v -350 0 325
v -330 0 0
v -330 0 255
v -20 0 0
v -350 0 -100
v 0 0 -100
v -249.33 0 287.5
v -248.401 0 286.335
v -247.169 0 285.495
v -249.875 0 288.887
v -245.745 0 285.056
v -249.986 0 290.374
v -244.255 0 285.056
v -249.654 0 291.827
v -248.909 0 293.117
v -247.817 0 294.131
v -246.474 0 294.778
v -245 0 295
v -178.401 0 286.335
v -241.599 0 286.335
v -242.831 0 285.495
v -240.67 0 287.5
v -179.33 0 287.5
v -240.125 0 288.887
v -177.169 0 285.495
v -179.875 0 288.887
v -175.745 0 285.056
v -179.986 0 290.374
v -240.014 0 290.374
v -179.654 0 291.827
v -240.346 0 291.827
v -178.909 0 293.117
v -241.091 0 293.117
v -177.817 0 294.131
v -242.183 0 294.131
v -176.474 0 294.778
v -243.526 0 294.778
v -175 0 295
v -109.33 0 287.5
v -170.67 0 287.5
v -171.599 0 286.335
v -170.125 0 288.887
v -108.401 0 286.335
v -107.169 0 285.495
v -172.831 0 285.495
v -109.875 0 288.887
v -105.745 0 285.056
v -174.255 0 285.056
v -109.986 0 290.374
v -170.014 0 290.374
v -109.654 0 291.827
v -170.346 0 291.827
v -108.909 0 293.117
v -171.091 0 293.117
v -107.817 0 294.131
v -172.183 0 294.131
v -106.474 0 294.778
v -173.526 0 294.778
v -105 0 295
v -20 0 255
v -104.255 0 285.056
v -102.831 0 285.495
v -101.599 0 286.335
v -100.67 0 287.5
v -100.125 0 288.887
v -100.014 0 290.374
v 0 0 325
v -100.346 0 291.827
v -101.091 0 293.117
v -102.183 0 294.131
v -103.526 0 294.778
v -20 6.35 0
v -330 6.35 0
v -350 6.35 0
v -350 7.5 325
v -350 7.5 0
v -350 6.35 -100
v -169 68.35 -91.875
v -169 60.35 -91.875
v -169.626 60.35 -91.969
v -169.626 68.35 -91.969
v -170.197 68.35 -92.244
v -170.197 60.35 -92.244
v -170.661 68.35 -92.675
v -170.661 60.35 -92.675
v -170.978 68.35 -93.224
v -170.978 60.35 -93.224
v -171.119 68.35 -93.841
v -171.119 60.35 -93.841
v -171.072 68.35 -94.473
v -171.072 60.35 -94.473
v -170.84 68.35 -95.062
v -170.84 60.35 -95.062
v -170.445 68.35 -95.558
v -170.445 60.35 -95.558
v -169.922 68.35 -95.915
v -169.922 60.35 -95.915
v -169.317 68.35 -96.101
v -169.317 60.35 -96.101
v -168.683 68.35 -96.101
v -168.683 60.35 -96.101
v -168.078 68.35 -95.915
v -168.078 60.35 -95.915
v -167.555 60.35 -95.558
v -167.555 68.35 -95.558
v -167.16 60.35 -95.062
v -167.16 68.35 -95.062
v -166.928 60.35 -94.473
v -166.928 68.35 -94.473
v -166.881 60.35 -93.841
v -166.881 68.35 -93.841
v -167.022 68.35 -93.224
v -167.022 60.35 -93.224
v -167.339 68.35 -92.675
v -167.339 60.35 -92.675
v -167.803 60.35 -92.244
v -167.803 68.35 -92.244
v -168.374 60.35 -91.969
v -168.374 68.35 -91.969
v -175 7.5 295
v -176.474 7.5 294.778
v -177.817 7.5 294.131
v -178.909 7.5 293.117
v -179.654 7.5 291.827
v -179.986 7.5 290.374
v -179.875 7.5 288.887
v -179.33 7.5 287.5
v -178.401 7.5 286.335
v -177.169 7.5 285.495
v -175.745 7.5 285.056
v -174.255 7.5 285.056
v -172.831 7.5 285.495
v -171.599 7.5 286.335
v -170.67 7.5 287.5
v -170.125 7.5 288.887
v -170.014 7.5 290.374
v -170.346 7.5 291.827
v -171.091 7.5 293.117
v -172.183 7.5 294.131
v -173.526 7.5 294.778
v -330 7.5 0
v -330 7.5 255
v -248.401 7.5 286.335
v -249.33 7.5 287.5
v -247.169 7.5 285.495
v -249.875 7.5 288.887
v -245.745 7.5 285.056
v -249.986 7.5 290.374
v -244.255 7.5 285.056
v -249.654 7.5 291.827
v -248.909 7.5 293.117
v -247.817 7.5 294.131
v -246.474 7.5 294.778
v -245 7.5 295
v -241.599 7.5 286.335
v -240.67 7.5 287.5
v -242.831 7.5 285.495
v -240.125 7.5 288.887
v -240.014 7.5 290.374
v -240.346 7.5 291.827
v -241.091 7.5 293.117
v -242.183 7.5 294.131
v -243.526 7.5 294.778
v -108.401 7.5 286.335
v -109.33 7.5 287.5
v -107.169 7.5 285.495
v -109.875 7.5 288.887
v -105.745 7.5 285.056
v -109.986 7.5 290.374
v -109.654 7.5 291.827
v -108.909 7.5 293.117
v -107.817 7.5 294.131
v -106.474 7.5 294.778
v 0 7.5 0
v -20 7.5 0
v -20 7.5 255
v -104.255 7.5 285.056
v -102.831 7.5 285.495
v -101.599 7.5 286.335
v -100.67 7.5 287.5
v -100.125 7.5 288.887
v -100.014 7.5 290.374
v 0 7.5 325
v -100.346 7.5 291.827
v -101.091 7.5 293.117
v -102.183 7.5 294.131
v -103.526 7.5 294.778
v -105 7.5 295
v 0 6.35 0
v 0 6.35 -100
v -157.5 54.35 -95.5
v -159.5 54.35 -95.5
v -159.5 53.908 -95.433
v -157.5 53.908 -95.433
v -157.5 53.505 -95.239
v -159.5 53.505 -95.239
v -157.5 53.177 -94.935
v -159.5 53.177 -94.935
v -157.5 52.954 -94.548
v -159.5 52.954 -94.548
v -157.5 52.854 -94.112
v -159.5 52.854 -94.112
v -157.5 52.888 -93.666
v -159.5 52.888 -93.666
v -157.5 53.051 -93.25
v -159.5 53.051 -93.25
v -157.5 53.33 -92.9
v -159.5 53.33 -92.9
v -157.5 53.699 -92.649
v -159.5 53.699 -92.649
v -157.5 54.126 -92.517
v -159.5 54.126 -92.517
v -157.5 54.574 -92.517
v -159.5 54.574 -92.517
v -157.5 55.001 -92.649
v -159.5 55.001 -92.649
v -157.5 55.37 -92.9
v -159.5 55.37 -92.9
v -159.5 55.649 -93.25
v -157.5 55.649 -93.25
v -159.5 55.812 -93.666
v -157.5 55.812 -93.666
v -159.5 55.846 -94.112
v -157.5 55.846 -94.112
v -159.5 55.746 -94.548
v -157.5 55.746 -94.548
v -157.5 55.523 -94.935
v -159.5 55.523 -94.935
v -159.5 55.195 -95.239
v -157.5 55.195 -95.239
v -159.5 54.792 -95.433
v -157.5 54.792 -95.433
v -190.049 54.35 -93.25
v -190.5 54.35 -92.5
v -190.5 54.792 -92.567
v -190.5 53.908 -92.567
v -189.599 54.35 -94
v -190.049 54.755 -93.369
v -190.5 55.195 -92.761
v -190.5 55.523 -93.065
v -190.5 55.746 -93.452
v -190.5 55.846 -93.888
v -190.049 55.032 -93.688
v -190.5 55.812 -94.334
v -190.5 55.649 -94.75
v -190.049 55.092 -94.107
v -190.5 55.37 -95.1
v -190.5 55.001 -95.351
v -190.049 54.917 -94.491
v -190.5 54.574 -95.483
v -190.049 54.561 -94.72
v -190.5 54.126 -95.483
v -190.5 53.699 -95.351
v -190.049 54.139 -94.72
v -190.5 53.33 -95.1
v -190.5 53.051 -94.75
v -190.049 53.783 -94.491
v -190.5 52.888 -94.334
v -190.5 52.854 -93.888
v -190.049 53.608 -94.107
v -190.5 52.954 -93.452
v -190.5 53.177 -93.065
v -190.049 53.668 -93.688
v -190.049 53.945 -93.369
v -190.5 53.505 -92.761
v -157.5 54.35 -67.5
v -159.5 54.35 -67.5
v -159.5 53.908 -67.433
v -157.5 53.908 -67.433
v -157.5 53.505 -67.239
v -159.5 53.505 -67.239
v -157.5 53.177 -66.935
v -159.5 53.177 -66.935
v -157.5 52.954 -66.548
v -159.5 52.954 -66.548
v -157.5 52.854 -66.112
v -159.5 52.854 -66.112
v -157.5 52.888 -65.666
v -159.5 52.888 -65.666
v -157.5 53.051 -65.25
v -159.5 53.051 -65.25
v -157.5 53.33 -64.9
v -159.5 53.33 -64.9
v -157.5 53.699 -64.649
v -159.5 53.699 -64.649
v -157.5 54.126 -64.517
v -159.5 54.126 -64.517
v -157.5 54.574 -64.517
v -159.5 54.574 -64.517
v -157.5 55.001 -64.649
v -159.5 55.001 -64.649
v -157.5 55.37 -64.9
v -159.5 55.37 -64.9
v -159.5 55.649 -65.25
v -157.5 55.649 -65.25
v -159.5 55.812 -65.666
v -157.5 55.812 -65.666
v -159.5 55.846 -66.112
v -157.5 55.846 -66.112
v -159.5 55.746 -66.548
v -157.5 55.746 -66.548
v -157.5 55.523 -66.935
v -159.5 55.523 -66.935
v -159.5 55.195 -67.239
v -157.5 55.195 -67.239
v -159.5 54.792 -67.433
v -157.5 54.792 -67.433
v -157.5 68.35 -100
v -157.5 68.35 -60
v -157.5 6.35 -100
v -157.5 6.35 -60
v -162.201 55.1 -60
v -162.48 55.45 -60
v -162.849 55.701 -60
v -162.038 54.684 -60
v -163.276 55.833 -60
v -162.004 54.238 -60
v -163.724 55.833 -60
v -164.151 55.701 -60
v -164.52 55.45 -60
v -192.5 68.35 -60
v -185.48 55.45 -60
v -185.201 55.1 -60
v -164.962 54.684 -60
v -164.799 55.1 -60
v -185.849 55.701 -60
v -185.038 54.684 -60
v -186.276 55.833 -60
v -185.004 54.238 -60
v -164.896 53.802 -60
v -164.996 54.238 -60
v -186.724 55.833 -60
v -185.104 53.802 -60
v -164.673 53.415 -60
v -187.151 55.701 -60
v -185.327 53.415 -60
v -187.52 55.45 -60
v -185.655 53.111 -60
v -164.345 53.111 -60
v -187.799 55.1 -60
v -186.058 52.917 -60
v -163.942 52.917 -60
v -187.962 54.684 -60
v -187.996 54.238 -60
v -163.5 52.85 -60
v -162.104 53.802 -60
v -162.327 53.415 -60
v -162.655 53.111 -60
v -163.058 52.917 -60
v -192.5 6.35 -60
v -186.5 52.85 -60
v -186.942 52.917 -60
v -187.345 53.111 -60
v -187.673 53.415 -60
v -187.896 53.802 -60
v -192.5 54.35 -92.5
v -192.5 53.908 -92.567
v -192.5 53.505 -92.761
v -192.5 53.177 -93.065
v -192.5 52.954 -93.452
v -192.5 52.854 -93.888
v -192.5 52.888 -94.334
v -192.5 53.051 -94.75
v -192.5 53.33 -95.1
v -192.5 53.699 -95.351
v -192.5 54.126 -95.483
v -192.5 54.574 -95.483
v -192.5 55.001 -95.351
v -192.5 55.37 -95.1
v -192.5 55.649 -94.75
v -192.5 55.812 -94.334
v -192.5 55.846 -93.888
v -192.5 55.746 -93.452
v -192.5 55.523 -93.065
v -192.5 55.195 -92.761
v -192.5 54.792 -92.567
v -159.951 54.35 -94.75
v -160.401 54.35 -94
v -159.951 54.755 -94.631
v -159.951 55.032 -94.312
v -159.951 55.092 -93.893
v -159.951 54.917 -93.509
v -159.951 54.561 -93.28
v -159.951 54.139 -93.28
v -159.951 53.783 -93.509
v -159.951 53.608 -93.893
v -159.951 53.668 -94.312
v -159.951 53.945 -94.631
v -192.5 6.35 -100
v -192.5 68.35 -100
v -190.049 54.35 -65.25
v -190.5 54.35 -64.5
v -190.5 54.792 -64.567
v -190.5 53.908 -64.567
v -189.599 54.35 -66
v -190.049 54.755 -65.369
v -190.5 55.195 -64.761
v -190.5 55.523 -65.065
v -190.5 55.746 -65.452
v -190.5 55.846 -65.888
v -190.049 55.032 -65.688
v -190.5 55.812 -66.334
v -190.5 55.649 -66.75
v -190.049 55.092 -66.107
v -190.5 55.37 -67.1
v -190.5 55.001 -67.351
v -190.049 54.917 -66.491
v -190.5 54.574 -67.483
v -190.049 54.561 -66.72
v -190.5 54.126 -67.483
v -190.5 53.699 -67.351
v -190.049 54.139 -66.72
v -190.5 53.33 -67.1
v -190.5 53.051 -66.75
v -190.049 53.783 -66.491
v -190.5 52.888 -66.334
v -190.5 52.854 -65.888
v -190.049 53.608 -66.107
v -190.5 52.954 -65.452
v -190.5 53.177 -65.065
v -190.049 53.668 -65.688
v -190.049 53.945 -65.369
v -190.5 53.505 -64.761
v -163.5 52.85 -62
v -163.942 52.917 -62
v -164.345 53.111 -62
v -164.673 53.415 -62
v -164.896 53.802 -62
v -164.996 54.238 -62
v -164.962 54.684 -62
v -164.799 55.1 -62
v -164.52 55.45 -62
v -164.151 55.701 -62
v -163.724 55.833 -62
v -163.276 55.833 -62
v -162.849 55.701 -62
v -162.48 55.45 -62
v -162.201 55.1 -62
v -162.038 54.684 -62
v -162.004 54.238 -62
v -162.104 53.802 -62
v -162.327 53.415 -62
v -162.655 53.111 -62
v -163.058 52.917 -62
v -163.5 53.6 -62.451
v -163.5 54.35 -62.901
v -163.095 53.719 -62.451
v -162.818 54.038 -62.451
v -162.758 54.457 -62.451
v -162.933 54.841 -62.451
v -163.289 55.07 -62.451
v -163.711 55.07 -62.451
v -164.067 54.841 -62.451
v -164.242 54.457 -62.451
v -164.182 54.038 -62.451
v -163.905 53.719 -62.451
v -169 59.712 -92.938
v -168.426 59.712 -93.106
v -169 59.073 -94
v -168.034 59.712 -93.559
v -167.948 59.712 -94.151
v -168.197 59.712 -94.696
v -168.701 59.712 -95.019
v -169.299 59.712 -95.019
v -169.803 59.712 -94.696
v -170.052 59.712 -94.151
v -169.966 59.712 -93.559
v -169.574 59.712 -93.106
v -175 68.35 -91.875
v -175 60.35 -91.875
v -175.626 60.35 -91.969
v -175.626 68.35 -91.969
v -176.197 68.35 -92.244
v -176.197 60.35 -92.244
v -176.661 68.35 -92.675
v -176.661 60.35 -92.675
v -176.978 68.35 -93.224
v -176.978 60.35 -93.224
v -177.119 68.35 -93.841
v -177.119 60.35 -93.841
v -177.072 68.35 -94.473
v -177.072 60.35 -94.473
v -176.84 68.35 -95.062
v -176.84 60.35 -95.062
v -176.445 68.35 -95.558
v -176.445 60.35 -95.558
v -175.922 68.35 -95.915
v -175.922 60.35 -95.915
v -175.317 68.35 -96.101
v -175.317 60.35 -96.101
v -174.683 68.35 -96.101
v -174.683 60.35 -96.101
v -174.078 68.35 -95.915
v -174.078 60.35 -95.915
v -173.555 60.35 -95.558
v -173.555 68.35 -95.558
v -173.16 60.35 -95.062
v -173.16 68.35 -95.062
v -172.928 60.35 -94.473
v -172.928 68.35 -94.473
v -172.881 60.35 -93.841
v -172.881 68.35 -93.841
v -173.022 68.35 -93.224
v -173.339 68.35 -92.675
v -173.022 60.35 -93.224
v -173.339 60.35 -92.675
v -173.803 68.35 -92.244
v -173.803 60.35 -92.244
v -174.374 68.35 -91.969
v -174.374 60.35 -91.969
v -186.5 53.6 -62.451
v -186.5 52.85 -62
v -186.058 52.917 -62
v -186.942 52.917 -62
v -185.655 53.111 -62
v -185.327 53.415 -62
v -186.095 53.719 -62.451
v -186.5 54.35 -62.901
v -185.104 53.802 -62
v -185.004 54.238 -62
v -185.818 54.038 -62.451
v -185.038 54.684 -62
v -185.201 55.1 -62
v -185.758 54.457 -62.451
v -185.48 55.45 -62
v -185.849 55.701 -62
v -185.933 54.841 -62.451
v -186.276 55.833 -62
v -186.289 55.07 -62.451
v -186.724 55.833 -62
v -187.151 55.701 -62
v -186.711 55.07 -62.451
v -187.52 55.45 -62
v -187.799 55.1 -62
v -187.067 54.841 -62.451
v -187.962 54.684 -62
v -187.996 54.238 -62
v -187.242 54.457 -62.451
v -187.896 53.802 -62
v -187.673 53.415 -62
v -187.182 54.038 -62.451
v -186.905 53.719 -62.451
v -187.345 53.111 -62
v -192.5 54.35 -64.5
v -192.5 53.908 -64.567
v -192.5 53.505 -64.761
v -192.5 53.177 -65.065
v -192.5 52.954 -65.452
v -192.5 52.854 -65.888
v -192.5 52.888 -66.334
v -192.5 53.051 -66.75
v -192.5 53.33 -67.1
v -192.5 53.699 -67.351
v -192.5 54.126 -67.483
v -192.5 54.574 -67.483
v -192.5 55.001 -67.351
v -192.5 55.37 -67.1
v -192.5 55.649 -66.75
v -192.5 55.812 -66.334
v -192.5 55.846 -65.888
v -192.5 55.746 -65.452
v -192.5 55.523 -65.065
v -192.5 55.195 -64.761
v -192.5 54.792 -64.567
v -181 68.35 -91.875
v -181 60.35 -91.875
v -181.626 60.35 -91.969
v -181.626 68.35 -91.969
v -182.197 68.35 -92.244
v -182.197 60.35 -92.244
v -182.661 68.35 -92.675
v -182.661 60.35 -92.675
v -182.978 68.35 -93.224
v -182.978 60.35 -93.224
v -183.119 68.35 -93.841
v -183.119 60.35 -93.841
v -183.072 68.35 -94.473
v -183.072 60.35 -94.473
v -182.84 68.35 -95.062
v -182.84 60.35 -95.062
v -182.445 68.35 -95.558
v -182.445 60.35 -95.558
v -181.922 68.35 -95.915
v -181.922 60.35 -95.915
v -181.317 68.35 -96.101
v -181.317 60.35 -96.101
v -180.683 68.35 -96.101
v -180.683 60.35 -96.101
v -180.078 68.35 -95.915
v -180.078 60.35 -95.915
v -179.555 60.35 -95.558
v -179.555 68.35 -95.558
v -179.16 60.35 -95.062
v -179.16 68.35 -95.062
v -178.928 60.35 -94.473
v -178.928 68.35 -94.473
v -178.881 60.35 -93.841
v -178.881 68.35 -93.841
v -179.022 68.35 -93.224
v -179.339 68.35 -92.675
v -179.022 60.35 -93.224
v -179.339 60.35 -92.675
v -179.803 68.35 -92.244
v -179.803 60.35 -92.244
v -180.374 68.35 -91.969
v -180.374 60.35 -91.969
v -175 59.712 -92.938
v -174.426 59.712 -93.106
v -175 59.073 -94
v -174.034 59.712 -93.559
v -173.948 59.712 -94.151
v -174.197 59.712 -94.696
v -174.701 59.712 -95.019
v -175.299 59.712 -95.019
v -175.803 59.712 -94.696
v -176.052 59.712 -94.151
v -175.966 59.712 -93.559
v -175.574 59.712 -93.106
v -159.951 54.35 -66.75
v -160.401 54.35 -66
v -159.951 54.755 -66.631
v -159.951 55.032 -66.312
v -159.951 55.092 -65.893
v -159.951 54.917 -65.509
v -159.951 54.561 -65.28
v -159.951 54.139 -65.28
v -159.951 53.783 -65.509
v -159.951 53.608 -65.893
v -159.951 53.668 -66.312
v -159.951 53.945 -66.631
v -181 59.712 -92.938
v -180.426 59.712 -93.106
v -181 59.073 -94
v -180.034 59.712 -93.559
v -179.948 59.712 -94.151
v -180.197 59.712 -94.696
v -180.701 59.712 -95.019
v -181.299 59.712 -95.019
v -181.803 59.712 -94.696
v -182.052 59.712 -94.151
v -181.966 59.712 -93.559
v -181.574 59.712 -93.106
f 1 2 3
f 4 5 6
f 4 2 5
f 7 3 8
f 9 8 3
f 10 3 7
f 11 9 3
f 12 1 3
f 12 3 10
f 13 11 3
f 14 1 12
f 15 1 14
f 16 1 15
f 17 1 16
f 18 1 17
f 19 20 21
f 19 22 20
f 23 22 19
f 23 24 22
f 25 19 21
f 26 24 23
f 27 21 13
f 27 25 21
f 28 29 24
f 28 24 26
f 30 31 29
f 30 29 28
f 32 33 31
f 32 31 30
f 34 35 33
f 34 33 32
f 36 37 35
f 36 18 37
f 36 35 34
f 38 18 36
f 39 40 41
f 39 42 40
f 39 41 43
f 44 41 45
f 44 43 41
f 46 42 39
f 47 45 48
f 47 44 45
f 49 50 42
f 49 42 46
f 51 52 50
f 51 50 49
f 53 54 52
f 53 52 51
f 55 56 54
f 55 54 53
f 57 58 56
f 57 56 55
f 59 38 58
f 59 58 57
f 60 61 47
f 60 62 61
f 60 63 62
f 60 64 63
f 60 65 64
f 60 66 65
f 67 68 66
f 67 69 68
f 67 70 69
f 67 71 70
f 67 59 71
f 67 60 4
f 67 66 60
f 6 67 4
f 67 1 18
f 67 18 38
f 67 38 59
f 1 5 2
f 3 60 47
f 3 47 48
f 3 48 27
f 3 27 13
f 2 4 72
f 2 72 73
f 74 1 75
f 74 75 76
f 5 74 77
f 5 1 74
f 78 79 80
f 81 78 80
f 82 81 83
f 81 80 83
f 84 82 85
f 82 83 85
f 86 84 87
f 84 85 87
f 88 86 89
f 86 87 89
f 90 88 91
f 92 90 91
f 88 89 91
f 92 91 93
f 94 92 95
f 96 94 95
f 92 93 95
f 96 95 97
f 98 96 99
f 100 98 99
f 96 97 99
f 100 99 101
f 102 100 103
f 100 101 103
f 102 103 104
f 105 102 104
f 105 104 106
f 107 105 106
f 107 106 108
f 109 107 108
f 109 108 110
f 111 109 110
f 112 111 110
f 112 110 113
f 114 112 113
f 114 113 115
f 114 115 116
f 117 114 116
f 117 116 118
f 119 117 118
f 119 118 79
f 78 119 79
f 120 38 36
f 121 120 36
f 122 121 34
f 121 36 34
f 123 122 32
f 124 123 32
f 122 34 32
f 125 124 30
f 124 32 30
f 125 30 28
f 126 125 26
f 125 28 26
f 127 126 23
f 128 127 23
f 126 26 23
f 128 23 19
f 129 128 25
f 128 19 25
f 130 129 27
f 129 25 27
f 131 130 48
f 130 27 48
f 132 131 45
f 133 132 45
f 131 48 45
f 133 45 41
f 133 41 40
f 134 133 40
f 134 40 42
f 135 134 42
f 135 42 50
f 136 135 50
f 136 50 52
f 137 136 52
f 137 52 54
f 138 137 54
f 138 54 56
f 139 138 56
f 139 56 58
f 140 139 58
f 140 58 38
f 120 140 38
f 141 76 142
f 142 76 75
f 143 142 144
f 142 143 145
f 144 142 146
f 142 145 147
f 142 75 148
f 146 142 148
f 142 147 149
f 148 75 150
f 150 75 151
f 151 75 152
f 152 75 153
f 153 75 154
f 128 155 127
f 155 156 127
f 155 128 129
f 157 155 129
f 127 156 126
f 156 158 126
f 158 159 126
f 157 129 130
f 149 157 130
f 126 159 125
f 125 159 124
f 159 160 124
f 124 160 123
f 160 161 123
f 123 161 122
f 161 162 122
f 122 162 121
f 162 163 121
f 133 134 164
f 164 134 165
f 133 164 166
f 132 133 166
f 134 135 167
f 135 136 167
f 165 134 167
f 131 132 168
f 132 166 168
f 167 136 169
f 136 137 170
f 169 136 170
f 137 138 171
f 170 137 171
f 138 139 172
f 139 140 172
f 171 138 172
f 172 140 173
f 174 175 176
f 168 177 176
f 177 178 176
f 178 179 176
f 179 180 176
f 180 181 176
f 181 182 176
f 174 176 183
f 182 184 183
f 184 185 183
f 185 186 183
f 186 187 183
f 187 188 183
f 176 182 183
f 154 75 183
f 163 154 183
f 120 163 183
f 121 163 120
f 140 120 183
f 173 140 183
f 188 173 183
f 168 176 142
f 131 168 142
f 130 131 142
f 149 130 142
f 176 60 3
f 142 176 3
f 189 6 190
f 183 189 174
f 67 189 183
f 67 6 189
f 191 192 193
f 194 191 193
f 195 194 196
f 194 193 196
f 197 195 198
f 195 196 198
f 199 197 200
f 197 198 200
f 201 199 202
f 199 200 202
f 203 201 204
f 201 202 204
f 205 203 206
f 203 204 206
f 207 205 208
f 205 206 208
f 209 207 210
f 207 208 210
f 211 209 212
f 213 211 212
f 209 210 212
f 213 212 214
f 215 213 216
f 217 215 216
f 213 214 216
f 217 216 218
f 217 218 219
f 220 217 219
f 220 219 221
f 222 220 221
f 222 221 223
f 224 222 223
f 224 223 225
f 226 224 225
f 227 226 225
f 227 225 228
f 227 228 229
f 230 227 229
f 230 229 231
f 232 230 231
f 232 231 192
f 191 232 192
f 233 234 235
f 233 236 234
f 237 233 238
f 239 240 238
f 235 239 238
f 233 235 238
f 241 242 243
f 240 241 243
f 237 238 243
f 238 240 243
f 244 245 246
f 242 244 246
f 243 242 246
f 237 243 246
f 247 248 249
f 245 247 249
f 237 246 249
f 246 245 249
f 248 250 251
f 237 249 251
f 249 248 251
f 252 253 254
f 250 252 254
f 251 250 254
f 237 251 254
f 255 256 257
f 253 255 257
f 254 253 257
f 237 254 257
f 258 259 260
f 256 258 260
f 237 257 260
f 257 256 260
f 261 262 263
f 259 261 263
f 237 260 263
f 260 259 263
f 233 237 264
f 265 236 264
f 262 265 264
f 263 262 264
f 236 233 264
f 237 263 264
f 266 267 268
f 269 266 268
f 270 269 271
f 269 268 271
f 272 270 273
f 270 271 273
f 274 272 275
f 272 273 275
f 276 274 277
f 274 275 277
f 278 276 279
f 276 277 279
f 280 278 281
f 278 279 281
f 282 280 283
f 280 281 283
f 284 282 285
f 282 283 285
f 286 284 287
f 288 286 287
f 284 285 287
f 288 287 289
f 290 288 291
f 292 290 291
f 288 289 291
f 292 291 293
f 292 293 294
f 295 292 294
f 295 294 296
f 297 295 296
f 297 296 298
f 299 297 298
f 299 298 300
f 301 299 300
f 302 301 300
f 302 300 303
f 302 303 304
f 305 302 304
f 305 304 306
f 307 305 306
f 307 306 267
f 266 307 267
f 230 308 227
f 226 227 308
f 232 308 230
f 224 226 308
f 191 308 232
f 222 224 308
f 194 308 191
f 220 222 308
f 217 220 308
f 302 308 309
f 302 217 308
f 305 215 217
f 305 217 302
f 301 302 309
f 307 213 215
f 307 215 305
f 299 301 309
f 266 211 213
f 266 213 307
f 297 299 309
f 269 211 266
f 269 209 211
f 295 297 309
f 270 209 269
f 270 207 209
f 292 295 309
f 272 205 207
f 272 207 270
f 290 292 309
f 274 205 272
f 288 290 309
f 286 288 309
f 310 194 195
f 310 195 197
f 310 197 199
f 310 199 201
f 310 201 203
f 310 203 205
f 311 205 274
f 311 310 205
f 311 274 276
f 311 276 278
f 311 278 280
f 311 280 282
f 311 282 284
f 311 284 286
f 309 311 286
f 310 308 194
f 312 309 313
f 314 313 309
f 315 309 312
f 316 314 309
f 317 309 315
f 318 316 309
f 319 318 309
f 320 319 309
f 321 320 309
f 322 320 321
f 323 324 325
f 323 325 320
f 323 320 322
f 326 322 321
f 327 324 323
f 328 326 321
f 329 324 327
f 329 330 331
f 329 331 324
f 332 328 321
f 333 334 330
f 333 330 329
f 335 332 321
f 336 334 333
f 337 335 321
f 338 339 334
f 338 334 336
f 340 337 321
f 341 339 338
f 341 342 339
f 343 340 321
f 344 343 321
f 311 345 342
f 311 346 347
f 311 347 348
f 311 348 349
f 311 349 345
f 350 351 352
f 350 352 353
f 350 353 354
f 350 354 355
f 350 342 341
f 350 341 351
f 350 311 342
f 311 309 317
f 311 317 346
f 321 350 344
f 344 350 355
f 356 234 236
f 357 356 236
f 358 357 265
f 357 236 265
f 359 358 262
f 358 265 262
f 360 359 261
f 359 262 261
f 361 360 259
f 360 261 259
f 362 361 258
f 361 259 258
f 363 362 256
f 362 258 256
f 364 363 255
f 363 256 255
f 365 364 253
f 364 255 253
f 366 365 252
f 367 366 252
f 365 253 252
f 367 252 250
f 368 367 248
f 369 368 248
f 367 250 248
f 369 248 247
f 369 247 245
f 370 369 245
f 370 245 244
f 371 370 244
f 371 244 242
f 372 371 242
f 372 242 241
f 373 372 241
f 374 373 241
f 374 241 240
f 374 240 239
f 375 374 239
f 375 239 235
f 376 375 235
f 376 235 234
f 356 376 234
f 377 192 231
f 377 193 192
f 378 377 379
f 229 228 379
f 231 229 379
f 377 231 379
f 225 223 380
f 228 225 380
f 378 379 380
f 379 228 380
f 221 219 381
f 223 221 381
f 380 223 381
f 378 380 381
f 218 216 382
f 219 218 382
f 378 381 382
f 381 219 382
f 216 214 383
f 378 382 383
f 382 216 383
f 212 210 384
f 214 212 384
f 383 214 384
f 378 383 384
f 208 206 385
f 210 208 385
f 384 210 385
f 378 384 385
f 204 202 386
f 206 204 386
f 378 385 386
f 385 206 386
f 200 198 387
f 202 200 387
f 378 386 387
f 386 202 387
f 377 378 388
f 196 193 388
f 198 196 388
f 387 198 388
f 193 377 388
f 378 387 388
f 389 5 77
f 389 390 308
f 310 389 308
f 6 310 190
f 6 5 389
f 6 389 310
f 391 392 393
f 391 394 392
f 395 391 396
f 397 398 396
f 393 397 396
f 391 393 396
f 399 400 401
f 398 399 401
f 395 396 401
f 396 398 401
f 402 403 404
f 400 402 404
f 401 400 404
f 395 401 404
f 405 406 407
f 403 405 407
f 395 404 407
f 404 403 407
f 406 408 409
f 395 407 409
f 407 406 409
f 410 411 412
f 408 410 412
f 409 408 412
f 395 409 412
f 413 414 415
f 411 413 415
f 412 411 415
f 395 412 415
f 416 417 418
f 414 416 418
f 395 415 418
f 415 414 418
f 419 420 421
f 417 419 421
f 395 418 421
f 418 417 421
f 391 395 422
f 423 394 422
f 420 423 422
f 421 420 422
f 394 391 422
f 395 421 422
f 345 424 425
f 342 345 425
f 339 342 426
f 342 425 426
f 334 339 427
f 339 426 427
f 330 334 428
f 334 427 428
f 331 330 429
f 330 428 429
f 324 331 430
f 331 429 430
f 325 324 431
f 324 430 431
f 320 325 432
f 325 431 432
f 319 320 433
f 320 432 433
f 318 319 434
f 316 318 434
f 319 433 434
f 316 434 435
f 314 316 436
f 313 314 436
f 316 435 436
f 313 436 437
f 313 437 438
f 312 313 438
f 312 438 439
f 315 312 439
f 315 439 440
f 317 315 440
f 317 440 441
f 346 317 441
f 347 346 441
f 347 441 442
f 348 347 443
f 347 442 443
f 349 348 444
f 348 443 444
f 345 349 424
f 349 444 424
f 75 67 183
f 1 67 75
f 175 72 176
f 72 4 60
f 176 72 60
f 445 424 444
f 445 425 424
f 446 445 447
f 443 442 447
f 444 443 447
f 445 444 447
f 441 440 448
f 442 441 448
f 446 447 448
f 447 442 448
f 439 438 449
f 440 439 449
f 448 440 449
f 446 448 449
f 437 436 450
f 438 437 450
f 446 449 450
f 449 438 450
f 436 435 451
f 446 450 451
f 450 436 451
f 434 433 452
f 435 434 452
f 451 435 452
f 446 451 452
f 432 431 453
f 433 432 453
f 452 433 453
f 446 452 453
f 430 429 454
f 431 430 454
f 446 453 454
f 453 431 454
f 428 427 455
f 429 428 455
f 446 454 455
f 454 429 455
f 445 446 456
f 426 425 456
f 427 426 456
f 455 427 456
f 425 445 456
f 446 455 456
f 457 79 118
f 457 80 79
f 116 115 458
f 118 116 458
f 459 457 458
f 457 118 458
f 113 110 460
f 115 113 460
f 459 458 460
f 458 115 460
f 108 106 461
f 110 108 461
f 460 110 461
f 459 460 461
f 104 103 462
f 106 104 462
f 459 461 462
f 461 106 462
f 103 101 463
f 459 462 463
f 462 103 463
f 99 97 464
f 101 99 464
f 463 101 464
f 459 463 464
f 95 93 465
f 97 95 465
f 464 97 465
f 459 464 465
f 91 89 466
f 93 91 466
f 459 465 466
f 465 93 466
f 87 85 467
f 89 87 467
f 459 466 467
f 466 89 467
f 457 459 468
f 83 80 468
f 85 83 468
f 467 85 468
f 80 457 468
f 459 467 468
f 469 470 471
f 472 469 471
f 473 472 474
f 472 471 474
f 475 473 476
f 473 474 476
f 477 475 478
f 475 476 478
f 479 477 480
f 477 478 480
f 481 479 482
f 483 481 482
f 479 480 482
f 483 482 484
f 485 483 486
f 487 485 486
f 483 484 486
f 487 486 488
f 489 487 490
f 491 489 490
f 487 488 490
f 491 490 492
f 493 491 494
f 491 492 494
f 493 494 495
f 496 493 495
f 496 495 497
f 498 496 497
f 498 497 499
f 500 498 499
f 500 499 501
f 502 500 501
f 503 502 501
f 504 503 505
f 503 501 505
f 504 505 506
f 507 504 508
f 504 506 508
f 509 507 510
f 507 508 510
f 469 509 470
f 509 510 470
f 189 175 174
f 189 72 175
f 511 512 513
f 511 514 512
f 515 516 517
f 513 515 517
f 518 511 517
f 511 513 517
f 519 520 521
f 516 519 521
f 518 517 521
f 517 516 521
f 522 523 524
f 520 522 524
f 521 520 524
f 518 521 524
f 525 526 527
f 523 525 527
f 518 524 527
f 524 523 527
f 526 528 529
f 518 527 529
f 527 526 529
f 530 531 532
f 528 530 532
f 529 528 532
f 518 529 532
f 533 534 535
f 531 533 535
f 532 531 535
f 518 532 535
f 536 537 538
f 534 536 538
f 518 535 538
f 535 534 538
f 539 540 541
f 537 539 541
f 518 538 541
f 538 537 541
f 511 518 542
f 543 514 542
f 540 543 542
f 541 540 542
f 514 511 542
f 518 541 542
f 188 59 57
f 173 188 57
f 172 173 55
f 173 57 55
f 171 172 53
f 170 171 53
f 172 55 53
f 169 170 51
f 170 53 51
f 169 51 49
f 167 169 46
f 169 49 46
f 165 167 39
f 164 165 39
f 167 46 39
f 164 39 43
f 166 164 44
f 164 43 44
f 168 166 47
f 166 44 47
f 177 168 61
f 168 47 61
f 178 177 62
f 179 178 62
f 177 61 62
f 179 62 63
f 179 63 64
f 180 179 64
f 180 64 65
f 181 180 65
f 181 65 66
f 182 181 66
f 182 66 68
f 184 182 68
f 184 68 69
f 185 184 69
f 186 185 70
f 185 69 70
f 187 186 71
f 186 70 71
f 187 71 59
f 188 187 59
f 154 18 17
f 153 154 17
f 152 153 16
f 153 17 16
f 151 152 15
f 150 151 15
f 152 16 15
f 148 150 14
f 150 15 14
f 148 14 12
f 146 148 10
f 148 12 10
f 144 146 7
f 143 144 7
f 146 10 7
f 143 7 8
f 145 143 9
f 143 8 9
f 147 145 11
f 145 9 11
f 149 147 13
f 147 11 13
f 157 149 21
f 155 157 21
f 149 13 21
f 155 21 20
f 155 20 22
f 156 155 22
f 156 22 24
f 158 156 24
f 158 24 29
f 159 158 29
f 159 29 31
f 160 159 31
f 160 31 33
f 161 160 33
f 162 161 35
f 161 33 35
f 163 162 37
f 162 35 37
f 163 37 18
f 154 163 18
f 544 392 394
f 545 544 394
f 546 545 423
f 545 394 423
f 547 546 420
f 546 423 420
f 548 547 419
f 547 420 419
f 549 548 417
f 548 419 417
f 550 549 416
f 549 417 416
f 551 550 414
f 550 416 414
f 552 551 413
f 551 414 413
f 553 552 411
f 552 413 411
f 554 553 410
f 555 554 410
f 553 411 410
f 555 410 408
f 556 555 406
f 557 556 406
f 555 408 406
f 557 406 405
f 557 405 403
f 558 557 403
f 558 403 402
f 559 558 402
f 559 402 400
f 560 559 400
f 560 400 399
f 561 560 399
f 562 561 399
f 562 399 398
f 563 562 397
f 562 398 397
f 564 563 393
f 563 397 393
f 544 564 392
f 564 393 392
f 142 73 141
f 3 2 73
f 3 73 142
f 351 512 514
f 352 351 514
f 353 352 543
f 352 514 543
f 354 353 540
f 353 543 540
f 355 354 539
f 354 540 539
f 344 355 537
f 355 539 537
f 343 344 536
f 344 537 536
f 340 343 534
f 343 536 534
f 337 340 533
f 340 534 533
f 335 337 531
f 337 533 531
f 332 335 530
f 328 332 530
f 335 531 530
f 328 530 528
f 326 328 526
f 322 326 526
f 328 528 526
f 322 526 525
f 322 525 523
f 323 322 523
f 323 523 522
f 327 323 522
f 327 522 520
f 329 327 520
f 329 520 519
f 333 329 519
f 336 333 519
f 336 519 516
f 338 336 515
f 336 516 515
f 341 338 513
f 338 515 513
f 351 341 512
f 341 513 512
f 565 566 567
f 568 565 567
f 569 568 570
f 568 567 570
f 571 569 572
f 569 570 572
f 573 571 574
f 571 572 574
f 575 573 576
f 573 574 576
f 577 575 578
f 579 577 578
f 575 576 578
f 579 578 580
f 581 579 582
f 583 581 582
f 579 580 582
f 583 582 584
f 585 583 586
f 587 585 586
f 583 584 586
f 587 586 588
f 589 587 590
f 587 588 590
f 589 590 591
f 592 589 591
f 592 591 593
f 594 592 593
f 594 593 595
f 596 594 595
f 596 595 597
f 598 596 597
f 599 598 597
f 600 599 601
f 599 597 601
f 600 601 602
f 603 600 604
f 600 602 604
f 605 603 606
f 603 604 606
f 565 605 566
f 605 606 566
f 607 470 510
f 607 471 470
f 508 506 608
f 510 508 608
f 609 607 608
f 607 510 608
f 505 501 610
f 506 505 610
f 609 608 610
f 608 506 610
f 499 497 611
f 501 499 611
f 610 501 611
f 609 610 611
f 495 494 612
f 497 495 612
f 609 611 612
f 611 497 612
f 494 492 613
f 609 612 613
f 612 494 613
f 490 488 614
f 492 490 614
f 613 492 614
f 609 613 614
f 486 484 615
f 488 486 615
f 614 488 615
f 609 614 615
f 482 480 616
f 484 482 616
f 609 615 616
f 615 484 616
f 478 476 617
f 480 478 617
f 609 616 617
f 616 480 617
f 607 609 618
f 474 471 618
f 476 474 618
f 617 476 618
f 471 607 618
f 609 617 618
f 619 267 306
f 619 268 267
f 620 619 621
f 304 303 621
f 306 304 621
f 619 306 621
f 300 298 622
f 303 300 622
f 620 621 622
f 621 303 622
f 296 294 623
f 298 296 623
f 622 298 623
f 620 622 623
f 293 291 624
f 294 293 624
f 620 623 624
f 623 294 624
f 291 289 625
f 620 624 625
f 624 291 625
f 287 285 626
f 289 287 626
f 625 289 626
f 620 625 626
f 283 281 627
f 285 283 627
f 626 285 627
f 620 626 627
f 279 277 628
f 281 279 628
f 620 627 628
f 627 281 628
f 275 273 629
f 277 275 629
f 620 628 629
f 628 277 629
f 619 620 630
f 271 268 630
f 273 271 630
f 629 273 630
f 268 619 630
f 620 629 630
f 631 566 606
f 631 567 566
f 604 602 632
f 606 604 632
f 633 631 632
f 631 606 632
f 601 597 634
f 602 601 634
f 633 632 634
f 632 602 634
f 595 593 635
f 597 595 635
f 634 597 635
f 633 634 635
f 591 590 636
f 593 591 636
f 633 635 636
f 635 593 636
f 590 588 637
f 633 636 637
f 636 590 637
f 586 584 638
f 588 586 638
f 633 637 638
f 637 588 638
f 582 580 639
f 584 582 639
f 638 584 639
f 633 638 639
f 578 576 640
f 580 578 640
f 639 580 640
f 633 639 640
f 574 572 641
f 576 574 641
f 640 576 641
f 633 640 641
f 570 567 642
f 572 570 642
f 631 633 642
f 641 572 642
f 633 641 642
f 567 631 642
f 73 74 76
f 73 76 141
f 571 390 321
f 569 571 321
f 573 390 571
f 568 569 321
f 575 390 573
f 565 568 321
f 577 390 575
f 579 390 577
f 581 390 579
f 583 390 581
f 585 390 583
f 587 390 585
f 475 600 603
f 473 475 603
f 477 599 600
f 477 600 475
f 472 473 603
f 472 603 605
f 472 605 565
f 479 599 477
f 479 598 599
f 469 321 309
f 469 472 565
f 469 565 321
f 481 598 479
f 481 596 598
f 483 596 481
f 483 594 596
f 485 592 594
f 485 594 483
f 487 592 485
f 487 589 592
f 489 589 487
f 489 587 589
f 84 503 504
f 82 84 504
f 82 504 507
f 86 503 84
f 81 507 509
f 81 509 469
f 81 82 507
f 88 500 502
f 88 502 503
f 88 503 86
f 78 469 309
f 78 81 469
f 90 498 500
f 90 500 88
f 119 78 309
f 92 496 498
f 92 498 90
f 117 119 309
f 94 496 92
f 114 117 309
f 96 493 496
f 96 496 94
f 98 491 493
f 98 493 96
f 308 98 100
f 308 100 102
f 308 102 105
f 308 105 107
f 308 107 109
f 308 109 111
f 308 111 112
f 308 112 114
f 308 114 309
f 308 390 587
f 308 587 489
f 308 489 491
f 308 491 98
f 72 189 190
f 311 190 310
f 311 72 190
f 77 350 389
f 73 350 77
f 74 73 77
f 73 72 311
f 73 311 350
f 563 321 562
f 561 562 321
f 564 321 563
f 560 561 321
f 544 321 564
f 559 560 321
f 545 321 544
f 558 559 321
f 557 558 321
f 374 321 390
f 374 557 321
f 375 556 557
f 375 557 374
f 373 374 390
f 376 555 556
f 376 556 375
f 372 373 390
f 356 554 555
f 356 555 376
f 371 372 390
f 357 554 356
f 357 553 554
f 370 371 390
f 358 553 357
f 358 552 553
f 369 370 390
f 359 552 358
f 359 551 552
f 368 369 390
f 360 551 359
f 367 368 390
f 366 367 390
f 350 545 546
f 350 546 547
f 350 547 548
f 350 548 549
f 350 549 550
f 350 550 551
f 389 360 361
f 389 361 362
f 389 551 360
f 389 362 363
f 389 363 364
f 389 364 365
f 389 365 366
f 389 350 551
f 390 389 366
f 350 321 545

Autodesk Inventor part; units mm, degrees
ref_plane "YZ Plane" through (0, 0, 0) normal (1, 0, 0) x (0, 1, 0)
ref_plane "XZ Plane" through (0, 0, 0) normal (0, 1, 0) x (-1, 0, 0)
ref_plane "XY Plane" through (0, 0, 0) normal (0, 0, 1) x (1, 0, 0)
sketch "Sketch1" plane through (0, 0, 0) normal (0, 1, 0) x (-1, 0, 0)
  line L0 (0, 0) -> (350, 0)
  line L1 (350, 0) -> (350, -100)
  line L2 (350, -100) -> (0, -100)
  line L3 (0, -100) -> (0, 0)
  dimension "d0" = 350
  dimension "d1" = 100
extrude "Extrusion1" add sketch "Sketch1" along normal blind 6.35
sketch "Sketch2" plane through (0, 6.35, 0) normal (0, 1, 0) x (1, 0, 0)
  line L0 (0, 100) -> (-350, 100) projected
  line L1 (-192.5, 100) -> (-157.5, 100)
  line L2 (-157.5, 100) -> (-157.5, 60)
  line L3 (-157.5, 60) -> (-192.5, 60)
  line L4 (-192.5, 60) -> (-192.5, 100)
  line L5 (0, 0) -> (0, 100) projected
  dimension "d10" = 35
  dimension "d11" = 40
  dimension "d12" = 157.5
extrude "Extrusion2" add sketch "Sketch2" along normal blind 62
sketch "Sketch3" plane through (0, 68.35, 0) normal (0, 1, 0) x (1, 0, 0)
  circle A0 centre (-175, 94) radius 2.125
  line L0 (-157.5, 100) -> (-192.5, 100) projected
  circle A1 centre (-169, 94) radius 2.125
  circle A2 centre (-181, 94) radius 2.125
  point P0 (0, 0)
  dimension "d15" = 4.25
  dimension "d16" = 6
  dimension "d17" = 4.25
  dimension "d18" = 6
  dimension "d19" = 4.25
  dimension "d20" = 6
hole "Hole1" at (-181, 68.35, -94) at (-175, 68.35, -94) at (-169, 68.35, -94) direction (0, -1, 0) diameter 4.25 depth 8 tip angle 118
sketch "Sketch4" plane through (-192.5, 6.35, -100) normal (-1, 0, 0) x (0, 0, 1)
  point P0 (100, -6.35)
sketch "Sketch5" plane through (-192.5, 6.35, -100) normal (-1, 0, 0) x (0, 0, 1)
  line L0 (0, 0) -> (0, 62) projected
  line L1 (0, 42) -> (40, 42)
  line L2 (40, 0) -> (40, 62) projected
  line L3 (0, 62) -> (40, 62) projected
  circle A0 centre (6, 48) radius 1.5
  circle A1 centre (34, 48) radius 1.5
  point P0 (100, -6.35)
  dimension "d28" = 20
  dimension "d29" = 3
  dimension "d30" = 3
  dimension "d31" = 6
  dimension "d32" = 6
  dimension "d33" = 6
  dimension "d34" = 6
hole "Hole2" at (-192.5, 54.35, -66) at (-192.5, 54.35, -94) direction (1, 0, 0) diameter 3 depth 2 tip angle 118
sketch "Sketch6" plane through (-192.5, 6.35, -60) normal (0, 0, 1) x (1, 0, 0)
  line L0 (0, 42) -> (35, 42)
  line L1 (0, 62) -> (35, 62) projected
  circle A0 centre (6, 48) radius 1.5
  line L2 (0, 0) -> (0, 62) projected
  circle A1 centre (29, 48) radius 1.5
  line L3 (35, 0) -> (35, 62) projected
  point P0 (192.5, -6.35)
  dimension "d42" = 20
  dimension "d43" = 3
  dimension "d44" = 6
  dimension "d45" = 6
  dimension "d46" = 3
  dimension "d47" = 6
  dimension "d48" = 6
hole "Hole3" at (-186.5, 54.35, -60) at (-163.5, 54.35, -60) direction (0, 0, -1) diameter 3 depth 2 tip angle 118
sketch "Sketch7" plane through (-157.5, 6.35, -60) normal (1, 0, 0) x (0, 0, -1)
  circle A0 centre (6, 48) radius 1.5 projected
  circle A1 centre (6, 48) radius 1.5
  circle A2 centre (34, 48) radius 1.5 projected
  circle A3 centre (34, 48) radius 1.5
  point P0 (-60, -6.35)
  dimension "d56" = 3
  dimension "d57" = 3
hole "Hole4" at (-157.5, 54.35, -66) at (-157.5, 54.35, -94) direction (-1, 0, 0) diameter 3 depth 2 tip angle 118
sketch "Sketch8" plane through (0, 0, 0) normal (0, -1, 0) x (1, 0, 0)
  line L0 (-350, -100) -> (0, -100) projected
  line L1 (-350, -100) -> (-330, -100)
  line L2 (-330, 0) -> (-330, 255)
  line L3 (-330, 325) -> (-350, 325)
  line L4 (-350, 325) -> (-350, 0)
  line L5 (-350, 325) -> (0, 325)
  line L6 (0, 0) -> (0, -100) projected
  line L7 (0, 325) -> (0, 0)
  line L8 (0, -100) -> (-20, -100)
  line L9 (0, -100) -> (-157.5, -100) projected
  line L10 (-20, 0) -> (-20, 255)
  line L11 (-20, 325) -> (50, 325) construction
  line L12 (-20, 255) -> (-330, 255)
  line L13 (-350, 0) -> (0, 0) projected
  line L14 (-350, 0) -> (-330, 0)
  line L15 (-20, 0) -> (0, 0)
  dimension "d65" = 20
  dimension "d66" = 425
extrude "Extrusion3" add sketch "Sketch8" against normal blind 7.5 contours L13 L4 L3 L5 L7 L10 L12 L2
sketch "Sketch9" plane through (0, 7.5, 0) normal (0, 1, 0) x (1, 0, 0)
  line L0 (-20, -255) -> (-330, -255) projected
  line L1 (-175, -255) -> (-175, -325)
  line L2 (-350, -325) -> (0, -325) projected
  line L3 (-175, -290) -> (-168, -290)
  line L4 (0, 100) -> (0, -325) projected
  line L5 (-168, -290) -> (-134.9357, -290)
  circle A0 centre (-175, -290) radius 5
  circle A1 centre (-105, -290) radius 5
  circle A2 centre (-245, -290) radius 5
  point P0 (0, 0)
  dimension "d73" = 7
  dimension "d74" = 10
  dimension "d75" = 10
  dimension "d76" = 10
  dimension "d77" = 70
  dimension "d78" = 70
hole "Hole5" at (-105, 7.5, 290) at (-175, 7.5, 290) at (-245, 7.5, 290) direction (0, -1, 0) diameter 10 depth 8 tip angle 118
properties part number "Base" material "Wood (Birch)"
